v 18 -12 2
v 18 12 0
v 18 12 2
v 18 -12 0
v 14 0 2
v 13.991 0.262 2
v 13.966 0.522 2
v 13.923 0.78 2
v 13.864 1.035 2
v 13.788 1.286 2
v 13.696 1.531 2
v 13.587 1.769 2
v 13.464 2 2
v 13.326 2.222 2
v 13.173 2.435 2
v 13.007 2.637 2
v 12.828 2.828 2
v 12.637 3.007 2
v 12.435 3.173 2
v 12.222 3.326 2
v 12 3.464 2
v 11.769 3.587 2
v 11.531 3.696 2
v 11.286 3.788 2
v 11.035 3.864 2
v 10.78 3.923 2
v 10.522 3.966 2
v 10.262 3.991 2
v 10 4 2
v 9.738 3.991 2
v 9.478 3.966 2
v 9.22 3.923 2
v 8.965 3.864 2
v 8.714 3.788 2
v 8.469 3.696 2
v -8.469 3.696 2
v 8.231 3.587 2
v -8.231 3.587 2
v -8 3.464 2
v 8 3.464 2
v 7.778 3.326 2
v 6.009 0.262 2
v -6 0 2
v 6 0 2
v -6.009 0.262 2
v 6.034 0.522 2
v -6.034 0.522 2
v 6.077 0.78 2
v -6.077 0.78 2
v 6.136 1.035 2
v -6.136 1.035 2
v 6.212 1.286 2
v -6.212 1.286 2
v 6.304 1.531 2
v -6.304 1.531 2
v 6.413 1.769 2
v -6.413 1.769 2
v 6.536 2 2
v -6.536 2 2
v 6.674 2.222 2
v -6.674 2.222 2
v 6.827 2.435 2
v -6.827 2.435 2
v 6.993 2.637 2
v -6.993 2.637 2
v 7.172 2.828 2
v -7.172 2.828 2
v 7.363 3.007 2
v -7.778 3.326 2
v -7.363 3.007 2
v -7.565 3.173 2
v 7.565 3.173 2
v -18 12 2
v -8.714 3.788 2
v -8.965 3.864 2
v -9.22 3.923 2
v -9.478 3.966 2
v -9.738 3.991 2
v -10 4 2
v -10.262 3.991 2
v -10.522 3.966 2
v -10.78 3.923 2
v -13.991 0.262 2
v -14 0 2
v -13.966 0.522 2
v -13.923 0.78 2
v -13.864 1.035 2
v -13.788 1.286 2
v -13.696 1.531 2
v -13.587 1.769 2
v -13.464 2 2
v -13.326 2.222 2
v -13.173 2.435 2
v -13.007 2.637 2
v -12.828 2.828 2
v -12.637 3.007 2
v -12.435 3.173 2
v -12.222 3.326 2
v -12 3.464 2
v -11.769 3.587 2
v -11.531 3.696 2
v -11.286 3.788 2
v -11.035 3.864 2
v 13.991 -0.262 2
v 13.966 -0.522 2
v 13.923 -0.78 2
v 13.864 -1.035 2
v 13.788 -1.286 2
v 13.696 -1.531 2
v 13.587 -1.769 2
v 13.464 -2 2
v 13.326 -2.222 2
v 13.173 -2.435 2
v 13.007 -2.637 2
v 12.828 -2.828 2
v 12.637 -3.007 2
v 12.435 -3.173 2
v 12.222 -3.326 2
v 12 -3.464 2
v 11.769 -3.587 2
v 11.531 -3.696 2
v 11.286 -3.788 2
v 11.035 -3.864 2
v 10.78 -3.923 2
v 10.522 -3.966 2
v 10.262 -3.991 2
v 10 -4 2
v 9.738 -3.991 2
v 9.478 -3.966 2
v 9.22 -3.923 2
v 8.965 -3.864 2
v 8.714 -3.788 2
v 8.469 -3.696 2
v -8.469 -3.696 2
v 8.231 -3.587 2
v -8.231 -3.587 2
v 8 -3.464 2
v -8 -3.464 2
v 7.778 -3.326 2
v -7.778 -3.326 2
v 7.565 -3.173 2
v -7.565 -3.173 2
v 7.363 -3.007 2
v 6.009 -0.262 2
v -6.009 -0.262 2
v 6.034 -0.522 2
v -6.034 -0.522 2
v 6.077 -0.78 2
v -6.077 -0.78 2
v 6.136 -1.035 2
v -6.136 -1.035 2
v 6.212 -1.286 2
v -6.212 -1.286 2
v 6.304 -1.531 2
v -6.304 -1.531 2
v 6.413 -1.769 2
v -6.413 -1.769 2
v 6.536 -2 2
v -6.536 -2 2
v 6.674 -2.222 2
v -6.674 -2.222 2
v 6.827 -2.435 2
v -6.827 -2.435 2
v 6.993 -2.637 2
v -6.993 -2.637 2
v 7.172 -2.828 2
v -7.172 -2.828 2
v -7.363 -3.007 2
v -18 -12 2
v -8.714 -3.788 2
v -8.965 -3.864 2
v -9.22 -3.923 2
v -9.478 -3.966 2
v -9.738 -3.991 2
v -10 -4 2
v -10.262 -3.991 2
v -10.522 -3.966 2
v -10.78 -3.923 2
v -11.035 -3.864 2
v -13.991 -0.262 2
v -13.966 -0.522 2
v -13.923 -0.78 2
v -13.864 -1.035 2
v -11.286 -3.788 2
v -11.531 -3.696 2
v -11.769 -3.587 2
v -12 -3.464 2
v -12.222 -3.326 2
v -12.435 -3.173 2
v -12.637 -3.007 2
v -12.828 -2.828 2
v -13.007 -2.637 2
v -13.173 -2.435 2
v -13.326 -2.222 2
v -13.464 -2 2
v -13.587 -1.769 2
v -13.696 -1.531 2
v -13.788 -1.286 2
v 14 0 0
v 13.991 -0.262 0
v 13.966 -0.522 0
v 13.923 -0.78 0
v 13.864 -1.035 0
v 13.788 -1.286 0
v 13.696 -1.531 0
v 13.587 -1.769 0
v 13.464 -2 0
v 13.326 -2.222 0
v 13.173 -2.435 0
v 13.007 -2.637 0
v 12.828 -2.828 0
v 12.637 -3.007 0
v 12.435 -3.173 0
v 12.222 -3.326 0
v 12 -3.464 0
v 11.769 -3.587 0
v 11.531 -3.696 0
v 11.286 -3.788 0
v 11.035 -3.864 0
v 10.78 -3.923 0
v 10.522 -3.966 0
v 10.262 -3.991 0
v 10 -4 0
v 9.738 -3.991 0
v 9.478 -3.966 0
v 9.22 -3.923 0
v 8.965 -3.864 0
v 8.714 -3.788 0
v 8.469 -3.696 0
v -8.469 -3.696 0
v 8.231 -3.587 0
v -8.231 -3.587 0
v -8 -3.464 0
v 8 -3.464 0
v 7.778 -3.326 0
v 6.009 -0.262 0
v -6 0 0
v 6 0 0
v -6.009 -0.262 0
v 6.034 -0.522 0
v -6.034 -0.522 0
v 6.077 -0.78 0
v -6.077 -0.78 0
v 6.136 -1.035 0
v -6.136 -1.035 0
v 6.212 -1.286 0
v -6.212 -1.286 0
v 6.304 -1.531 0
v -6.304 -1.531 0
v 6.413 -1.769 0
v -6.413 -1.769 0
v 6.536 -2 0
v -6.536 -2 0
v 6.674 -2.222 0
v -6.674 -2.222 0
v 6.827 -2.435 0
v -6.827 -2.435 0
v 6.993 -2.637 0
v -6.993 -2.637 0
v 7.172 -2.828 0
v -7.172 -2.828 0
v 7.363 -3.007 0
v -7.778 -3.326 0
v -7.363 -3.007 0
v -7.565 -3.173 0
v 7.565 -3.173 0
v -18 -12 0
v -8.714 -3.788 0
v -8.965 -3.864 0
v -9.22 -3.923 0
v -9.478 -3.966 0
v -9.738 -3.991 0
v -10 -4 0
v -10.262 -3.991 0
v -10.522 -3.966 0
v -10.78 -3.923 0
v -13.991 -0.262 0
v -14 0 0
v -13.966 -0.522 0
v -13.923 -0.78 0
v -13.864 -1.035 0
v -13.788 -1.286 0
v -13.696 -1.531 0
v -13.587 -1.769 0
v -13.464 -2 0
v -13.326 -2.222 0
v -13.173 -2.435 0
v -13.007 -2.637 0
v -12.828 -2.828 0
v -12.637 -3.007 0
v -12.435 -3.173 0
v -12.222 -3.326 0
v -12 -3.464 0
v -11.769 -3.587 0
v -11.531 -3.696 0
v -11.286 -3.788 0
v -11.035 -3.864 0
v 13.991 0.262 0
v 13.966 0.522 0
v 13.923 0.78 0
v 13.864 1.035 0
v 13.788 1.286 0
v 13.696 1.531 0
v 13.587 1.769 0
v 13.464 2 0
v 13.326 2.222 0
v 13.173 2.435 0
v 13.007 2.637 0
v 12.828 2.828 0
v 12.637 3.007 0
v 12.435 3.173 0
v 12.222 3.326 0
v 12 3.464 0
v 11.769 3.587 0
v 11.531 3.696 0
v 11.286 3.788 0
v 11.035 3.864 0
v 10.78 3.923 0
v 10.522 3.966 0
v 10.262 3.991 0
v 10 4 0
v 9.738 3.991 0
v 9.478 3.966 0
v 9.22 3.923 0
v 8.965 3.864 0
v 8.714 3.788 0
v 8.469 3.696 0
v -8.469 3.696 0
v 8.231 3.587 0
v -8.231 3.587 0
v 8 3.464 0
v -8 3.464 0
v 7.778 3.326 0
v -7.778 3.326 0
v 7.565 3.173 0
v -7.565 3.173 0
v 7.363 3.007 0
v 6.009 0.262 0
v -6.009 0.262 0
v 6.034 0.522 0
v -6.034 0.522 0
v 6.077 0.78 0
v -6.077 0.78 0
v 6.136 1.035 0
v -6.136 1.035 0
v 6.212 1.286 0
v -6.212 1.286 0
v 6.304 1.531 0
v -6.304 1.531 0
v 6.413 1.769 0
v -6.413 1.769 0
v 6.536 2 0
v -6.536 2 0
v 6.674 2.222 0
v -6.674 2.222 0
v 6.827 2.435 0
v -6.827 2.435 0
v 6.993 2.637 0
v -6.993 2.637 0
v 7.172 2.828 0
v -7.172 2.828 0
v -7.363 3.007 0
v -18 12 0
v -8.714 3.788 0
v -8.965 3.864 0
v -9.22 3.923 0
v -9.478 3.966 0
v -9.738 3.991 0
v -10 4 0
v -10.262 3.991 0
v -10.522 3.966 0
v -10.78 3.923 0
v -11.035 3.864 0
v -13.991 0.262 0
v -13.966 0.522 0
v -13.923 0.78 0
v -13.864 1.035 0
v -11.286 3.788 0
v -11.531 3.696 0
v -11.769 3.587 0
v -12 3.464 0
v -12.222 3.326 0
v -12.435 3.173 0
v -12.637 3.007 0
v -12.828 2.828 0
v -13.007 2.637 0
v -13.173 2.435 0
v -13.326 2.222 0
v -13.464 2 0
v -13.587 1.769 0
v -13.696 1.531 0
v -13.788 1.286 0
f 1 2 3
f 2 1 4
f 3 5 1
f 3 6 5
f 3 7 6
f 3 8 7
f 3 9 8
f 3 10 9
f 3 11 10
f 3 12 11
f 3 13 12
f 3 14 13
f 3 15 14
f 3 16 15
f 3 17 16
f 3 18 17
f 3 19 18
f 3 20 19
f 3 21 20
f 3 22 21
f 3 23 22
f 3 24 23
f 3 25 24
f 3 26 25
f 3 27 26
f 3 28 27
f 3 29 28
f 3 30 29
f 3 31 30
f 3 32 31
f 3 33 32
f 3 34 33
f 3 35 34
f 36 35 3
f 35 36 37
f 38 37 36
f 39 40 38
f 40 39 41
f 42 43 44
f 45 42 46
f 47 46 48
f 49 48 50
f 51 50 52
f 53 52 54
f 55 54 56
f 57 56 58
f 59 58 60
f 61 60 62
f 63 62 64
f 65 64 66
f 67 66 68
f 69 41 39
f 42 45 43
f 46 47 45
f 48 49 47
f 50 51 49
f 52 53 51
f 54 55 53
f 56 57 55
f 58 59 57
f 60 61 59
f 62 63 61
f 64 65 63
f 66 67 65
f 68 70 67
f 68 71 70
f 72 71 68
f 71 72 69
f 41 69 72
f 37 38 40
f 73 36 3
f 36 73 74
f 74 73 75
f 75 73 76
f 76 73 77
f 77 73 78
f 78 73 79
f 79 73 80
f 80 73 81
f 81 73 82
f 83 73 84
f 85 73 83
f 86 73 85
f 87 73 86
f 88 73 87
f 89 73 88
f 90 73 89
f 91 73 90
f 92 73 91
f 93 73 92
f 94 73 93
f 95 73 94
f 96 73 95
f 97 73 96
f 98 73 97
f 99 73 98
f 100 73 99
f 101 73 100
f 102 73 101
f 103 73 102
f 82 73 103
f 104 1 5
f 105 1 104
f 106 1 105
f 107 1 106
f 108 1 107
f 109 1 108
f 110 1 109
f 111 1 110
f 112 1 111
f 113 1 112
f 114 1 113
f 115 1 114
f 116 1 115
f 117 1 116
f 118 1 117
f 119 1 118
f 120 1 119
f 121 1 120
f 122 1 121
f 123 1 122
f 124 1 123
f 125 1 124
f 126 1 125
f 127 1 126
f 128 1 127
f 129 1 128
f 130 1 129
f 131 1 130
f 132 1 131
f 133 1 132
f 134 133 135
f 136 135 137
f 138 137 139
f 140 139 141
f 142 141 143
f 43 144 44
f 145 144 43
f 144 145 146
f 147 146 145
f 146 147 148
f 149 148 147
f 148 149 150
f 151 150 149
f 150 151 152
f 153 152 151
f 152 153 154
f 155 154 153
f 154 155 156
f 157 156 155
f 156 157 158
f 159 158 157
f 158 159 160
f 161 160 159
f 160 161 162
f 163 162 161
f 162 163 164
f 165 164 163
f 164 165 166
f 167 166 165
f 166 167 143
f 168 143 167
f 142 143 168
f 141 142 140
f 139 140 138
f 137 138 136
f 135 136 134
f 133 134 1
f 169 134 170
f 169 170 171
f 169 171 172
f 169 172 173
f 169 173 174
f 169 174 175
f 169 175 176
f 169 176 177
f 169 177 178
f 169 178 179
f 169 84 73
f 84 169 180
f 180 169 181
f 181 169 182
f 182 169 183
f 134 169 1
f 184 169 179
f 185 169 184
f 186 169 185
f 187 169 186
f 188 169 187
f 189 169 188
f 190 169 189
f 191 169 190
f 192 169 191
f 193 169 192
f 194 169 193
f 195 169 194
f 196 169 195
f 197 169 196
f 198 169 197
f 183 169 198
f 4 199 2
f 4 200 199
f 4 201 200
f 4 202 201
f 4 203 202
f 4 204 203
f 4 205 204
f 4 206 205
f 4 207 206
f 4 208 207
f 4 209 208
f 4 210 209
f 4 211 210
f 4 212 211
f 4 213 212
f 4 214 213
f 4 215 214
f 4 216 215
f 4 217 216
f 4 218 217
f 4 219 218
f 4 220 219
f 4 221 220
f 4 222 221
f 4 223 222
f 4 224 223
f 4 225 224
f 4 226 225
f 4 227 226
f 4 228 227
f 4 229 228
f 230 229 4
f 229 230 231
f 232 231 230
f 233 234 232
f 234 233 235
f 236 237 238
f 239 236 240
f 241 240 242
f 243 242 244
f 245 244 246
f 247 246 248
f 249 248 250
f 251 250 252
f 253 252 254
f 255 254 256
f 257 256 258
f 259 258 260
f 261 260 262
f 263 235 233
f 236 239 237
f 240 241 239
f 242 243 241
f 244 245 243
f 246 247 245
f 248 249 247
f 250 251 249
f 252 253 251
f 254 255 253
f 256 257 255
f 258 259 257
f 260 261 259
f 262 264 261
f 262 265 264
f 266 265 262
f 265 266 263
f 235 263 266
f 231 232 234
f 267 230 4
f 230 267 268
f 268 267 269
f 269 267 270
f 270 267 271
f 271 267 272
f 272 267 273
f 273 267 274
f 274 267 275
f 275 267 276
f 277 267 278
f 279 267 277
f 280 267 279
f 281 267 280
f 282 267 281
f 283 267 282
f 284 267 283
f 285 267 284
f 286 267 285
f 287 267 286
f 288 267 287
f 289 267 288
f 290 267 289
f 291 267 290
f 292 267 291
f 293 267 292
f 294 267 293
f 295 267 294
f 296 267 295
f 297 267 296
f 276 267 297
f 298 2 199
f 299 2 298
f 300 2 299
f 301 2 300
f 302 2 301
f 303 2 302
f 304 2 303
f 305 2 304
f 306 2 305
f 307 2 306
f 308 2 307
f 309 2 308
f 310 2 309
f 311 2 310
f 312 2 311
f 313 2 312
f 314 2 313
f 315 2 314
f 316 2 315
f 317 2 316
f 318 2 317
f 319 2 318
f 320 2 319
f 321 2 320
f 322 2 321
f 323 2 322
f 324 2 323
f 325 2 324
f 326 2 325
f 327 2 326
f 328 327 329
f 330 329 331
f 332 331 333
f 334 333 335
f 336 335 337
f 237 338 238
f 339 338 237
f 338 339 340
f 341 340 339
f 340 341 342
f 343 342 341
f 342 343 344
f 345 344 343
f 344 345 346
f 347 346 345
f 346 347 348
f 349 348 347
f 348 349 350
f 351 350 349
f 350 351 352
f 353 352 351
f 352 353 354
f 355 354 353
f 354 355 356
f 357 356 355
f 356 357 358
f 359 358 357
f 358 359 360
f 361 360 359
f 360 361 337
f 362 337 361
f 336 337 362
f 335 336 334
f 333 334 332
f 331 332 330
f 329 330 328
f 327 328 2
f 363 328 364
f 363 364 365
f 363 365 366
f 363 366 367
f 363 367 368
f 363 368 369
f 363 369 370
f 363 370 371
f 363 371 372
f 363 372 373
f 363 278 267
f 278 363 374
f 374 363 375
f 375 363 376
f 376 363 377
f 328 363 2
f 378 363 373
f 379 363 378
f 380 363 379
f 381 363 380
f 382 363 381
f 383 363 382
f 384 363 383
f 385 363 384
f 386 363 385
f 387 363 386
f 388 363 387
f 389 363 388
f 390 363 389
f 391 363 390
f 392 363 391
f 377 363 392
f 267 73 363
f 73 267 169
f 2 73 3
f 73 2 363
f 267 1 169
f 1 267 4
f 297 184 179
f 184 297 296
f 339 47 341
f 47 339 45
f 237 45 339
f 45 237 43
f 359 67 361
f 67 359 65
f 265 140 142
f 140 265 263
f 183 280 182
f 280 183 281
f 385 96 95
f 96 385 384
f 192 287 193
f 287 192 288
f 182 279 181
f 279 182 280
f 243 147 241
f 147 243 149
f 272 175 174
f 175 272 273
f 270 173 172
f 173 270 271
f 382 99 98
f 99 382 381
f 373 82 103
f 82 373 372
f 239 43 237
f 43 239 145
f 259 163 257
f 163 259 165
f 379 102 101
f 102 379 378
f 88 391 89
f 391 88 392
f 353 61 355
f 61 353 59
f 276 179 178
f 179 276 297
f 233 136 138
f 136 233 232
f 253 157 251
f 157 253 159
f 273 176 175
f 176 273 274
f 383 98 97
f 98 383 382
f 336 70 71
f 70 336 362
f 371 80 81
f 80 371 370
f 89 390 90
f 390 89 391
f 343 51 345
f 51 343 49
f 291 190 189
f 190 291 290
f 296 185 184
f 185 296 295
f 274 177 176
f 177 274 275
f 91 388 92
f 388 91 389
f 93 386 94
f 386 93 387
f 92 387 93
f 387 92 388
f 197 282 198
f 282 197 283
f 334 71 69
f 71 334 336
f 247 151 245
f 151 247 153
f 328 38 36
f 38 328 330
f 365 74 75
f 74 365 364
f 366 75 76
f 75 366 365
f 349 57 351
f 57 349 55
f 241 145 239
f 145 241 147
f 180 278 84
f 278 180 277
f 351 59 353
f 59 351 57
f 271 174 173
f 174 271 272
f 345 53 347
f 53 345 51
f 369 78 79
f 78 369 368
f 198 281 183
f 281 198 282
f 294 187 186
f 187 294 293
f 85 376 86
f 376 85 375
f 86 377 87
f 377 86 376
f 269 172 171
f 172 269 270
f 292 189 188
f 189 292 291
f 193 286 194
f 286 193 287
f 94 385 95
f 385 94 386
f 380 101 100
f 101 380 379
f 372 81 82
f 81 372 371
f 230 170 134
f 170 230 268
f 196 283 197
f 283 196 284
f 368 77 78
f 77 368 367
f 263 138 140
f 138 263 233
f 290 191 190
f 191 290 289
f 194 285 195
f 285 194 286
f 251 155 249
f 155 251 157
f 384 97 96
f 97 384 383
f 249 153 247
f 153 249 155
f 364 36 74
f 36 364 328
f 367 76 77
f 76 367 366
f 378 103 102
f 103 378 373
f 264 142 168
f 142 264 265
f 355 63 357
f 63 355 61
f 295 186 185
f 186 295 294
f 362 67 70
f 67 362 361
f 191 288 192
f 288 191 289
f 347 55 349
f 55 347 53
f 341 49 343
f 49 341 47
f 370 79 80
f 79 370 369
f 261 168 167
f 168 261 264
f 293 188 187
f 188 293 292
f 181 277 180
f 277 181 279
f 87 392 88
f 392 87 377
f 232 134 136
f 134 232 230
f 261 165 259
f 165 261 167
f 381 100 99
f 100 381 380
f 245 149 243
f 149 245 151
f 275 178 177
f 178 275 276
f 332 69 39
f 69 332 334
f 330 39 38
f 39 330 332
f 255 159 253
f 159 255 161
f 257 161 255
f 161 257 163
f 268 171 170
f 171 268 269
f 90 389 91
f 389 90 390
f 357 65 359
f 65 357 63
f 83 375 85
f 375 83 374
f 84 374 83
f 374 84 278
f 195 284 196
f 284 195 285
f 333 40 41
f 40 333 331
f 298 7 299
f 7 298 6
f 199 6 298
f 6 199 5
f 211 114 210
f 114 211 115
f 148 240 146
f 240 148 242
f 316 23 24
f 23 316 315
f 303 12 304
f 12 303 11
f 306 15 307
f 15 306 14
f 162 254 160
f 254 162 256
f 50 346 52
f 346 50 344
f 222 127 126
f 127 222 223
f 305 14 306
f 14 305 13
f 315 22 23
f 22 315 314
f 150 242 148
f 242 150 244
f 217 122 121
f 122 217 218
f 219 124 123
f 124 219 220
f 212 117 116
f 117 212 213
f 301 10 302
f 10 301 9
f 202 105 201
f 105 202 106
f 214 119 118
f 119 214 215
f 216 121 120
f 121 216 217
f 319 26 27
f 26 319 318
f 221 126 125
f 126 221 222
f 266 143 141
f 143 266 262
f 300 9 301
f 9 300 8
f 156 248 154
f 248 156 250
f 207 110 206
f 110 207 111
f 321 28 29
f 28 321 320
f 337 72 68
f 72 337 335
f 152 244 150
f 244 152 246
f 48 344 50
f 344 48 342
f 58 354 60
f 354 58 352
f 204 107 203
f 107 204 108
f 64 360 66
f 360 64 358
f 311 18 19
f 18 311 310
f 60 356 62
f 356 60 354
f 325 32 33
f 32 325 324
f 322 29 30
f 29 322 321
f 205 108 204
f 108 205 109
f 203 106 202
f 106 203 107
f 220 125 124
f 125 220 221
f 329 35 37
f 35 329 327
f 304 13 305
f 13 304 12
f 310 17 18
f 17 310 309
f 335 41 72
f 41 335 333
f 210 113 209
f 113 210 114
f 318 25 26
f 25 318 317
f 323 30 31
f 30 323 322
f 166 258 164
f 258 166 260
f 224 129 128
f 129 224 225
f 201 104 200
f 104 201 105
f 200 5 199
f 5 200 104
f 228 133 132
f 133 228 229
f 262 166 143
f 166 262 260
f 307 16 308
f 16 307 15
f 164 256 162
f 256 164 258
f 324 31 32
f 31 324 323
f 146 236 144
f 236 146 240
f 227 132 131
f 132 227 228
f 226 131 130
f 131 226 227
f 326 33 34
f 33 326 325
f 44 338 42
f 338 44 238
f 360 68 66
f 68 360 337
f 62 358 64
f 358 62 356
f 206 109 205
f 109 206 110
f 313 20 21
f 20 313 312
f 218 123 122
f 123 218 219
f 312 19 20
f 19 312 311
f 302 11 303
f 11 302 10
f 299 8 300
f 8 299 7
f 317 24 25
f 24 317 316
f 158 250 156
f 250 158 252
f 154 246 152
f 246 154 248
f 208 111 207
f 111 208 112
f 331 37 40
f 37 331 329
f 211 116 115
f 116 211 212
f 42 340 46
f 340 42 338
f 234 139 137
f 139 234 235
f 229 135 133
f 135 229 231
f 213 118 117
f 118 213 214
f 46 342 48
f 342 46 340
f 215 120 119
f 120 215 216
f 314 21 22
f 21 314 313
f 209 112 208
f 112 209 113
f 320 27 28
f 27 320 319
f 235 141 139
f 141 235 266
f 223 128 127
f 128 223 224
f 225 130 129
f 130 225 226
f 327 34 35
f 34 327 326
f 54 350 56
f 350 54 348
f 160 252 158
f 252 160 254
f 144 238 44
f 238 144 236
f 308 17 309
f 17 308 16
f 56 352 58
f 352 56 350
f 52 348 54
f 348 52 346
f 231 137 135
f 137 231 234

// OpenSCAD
// Auto-generated from tests/data/feature_fixtures_manifest.json
// fixture: plate_large_hole_pair
// fixture_type: plate
// description: Large-diameter hole pair to exercise detector radius limits.
$fn = 96;

plate_size = [36.000000, 24.000000, 2.000000];
plate_origin = [-18.000000, -12.000000, 0.000000];

module through_hole(center, diameter, height) {
  translate(center) cylinder(d=diameter, h=height, center=false);
}

module through_slot(start, end, width, height) {
  hull() {
    through_hole(start, width, height);
    through_hole(end, width, height);
  }
}

module counterbore_hole(center, through_d, bore_d, bore_depth, plate_thickness) {
  translate([center[0], center[1], -0.1])
    cylinder(d=through_d, h=plate_thickness + 0.2, center=false);
  translate([center[0], center[1], plate_thickness - bore_depth])
    cylinder(d=bore_d, h=bore_depth + 0.1, center=false);
}

difference() {
  translate(plate_origin) cube(plate_size);
  through_hole([-10.000000, 0.000000, -0.100000], 8.000000, 2.200000);  // hole_0
  through_hole([10.000000, 0.000000, -0.100000], 8.000000, 2.200000);  // hole_1
}
